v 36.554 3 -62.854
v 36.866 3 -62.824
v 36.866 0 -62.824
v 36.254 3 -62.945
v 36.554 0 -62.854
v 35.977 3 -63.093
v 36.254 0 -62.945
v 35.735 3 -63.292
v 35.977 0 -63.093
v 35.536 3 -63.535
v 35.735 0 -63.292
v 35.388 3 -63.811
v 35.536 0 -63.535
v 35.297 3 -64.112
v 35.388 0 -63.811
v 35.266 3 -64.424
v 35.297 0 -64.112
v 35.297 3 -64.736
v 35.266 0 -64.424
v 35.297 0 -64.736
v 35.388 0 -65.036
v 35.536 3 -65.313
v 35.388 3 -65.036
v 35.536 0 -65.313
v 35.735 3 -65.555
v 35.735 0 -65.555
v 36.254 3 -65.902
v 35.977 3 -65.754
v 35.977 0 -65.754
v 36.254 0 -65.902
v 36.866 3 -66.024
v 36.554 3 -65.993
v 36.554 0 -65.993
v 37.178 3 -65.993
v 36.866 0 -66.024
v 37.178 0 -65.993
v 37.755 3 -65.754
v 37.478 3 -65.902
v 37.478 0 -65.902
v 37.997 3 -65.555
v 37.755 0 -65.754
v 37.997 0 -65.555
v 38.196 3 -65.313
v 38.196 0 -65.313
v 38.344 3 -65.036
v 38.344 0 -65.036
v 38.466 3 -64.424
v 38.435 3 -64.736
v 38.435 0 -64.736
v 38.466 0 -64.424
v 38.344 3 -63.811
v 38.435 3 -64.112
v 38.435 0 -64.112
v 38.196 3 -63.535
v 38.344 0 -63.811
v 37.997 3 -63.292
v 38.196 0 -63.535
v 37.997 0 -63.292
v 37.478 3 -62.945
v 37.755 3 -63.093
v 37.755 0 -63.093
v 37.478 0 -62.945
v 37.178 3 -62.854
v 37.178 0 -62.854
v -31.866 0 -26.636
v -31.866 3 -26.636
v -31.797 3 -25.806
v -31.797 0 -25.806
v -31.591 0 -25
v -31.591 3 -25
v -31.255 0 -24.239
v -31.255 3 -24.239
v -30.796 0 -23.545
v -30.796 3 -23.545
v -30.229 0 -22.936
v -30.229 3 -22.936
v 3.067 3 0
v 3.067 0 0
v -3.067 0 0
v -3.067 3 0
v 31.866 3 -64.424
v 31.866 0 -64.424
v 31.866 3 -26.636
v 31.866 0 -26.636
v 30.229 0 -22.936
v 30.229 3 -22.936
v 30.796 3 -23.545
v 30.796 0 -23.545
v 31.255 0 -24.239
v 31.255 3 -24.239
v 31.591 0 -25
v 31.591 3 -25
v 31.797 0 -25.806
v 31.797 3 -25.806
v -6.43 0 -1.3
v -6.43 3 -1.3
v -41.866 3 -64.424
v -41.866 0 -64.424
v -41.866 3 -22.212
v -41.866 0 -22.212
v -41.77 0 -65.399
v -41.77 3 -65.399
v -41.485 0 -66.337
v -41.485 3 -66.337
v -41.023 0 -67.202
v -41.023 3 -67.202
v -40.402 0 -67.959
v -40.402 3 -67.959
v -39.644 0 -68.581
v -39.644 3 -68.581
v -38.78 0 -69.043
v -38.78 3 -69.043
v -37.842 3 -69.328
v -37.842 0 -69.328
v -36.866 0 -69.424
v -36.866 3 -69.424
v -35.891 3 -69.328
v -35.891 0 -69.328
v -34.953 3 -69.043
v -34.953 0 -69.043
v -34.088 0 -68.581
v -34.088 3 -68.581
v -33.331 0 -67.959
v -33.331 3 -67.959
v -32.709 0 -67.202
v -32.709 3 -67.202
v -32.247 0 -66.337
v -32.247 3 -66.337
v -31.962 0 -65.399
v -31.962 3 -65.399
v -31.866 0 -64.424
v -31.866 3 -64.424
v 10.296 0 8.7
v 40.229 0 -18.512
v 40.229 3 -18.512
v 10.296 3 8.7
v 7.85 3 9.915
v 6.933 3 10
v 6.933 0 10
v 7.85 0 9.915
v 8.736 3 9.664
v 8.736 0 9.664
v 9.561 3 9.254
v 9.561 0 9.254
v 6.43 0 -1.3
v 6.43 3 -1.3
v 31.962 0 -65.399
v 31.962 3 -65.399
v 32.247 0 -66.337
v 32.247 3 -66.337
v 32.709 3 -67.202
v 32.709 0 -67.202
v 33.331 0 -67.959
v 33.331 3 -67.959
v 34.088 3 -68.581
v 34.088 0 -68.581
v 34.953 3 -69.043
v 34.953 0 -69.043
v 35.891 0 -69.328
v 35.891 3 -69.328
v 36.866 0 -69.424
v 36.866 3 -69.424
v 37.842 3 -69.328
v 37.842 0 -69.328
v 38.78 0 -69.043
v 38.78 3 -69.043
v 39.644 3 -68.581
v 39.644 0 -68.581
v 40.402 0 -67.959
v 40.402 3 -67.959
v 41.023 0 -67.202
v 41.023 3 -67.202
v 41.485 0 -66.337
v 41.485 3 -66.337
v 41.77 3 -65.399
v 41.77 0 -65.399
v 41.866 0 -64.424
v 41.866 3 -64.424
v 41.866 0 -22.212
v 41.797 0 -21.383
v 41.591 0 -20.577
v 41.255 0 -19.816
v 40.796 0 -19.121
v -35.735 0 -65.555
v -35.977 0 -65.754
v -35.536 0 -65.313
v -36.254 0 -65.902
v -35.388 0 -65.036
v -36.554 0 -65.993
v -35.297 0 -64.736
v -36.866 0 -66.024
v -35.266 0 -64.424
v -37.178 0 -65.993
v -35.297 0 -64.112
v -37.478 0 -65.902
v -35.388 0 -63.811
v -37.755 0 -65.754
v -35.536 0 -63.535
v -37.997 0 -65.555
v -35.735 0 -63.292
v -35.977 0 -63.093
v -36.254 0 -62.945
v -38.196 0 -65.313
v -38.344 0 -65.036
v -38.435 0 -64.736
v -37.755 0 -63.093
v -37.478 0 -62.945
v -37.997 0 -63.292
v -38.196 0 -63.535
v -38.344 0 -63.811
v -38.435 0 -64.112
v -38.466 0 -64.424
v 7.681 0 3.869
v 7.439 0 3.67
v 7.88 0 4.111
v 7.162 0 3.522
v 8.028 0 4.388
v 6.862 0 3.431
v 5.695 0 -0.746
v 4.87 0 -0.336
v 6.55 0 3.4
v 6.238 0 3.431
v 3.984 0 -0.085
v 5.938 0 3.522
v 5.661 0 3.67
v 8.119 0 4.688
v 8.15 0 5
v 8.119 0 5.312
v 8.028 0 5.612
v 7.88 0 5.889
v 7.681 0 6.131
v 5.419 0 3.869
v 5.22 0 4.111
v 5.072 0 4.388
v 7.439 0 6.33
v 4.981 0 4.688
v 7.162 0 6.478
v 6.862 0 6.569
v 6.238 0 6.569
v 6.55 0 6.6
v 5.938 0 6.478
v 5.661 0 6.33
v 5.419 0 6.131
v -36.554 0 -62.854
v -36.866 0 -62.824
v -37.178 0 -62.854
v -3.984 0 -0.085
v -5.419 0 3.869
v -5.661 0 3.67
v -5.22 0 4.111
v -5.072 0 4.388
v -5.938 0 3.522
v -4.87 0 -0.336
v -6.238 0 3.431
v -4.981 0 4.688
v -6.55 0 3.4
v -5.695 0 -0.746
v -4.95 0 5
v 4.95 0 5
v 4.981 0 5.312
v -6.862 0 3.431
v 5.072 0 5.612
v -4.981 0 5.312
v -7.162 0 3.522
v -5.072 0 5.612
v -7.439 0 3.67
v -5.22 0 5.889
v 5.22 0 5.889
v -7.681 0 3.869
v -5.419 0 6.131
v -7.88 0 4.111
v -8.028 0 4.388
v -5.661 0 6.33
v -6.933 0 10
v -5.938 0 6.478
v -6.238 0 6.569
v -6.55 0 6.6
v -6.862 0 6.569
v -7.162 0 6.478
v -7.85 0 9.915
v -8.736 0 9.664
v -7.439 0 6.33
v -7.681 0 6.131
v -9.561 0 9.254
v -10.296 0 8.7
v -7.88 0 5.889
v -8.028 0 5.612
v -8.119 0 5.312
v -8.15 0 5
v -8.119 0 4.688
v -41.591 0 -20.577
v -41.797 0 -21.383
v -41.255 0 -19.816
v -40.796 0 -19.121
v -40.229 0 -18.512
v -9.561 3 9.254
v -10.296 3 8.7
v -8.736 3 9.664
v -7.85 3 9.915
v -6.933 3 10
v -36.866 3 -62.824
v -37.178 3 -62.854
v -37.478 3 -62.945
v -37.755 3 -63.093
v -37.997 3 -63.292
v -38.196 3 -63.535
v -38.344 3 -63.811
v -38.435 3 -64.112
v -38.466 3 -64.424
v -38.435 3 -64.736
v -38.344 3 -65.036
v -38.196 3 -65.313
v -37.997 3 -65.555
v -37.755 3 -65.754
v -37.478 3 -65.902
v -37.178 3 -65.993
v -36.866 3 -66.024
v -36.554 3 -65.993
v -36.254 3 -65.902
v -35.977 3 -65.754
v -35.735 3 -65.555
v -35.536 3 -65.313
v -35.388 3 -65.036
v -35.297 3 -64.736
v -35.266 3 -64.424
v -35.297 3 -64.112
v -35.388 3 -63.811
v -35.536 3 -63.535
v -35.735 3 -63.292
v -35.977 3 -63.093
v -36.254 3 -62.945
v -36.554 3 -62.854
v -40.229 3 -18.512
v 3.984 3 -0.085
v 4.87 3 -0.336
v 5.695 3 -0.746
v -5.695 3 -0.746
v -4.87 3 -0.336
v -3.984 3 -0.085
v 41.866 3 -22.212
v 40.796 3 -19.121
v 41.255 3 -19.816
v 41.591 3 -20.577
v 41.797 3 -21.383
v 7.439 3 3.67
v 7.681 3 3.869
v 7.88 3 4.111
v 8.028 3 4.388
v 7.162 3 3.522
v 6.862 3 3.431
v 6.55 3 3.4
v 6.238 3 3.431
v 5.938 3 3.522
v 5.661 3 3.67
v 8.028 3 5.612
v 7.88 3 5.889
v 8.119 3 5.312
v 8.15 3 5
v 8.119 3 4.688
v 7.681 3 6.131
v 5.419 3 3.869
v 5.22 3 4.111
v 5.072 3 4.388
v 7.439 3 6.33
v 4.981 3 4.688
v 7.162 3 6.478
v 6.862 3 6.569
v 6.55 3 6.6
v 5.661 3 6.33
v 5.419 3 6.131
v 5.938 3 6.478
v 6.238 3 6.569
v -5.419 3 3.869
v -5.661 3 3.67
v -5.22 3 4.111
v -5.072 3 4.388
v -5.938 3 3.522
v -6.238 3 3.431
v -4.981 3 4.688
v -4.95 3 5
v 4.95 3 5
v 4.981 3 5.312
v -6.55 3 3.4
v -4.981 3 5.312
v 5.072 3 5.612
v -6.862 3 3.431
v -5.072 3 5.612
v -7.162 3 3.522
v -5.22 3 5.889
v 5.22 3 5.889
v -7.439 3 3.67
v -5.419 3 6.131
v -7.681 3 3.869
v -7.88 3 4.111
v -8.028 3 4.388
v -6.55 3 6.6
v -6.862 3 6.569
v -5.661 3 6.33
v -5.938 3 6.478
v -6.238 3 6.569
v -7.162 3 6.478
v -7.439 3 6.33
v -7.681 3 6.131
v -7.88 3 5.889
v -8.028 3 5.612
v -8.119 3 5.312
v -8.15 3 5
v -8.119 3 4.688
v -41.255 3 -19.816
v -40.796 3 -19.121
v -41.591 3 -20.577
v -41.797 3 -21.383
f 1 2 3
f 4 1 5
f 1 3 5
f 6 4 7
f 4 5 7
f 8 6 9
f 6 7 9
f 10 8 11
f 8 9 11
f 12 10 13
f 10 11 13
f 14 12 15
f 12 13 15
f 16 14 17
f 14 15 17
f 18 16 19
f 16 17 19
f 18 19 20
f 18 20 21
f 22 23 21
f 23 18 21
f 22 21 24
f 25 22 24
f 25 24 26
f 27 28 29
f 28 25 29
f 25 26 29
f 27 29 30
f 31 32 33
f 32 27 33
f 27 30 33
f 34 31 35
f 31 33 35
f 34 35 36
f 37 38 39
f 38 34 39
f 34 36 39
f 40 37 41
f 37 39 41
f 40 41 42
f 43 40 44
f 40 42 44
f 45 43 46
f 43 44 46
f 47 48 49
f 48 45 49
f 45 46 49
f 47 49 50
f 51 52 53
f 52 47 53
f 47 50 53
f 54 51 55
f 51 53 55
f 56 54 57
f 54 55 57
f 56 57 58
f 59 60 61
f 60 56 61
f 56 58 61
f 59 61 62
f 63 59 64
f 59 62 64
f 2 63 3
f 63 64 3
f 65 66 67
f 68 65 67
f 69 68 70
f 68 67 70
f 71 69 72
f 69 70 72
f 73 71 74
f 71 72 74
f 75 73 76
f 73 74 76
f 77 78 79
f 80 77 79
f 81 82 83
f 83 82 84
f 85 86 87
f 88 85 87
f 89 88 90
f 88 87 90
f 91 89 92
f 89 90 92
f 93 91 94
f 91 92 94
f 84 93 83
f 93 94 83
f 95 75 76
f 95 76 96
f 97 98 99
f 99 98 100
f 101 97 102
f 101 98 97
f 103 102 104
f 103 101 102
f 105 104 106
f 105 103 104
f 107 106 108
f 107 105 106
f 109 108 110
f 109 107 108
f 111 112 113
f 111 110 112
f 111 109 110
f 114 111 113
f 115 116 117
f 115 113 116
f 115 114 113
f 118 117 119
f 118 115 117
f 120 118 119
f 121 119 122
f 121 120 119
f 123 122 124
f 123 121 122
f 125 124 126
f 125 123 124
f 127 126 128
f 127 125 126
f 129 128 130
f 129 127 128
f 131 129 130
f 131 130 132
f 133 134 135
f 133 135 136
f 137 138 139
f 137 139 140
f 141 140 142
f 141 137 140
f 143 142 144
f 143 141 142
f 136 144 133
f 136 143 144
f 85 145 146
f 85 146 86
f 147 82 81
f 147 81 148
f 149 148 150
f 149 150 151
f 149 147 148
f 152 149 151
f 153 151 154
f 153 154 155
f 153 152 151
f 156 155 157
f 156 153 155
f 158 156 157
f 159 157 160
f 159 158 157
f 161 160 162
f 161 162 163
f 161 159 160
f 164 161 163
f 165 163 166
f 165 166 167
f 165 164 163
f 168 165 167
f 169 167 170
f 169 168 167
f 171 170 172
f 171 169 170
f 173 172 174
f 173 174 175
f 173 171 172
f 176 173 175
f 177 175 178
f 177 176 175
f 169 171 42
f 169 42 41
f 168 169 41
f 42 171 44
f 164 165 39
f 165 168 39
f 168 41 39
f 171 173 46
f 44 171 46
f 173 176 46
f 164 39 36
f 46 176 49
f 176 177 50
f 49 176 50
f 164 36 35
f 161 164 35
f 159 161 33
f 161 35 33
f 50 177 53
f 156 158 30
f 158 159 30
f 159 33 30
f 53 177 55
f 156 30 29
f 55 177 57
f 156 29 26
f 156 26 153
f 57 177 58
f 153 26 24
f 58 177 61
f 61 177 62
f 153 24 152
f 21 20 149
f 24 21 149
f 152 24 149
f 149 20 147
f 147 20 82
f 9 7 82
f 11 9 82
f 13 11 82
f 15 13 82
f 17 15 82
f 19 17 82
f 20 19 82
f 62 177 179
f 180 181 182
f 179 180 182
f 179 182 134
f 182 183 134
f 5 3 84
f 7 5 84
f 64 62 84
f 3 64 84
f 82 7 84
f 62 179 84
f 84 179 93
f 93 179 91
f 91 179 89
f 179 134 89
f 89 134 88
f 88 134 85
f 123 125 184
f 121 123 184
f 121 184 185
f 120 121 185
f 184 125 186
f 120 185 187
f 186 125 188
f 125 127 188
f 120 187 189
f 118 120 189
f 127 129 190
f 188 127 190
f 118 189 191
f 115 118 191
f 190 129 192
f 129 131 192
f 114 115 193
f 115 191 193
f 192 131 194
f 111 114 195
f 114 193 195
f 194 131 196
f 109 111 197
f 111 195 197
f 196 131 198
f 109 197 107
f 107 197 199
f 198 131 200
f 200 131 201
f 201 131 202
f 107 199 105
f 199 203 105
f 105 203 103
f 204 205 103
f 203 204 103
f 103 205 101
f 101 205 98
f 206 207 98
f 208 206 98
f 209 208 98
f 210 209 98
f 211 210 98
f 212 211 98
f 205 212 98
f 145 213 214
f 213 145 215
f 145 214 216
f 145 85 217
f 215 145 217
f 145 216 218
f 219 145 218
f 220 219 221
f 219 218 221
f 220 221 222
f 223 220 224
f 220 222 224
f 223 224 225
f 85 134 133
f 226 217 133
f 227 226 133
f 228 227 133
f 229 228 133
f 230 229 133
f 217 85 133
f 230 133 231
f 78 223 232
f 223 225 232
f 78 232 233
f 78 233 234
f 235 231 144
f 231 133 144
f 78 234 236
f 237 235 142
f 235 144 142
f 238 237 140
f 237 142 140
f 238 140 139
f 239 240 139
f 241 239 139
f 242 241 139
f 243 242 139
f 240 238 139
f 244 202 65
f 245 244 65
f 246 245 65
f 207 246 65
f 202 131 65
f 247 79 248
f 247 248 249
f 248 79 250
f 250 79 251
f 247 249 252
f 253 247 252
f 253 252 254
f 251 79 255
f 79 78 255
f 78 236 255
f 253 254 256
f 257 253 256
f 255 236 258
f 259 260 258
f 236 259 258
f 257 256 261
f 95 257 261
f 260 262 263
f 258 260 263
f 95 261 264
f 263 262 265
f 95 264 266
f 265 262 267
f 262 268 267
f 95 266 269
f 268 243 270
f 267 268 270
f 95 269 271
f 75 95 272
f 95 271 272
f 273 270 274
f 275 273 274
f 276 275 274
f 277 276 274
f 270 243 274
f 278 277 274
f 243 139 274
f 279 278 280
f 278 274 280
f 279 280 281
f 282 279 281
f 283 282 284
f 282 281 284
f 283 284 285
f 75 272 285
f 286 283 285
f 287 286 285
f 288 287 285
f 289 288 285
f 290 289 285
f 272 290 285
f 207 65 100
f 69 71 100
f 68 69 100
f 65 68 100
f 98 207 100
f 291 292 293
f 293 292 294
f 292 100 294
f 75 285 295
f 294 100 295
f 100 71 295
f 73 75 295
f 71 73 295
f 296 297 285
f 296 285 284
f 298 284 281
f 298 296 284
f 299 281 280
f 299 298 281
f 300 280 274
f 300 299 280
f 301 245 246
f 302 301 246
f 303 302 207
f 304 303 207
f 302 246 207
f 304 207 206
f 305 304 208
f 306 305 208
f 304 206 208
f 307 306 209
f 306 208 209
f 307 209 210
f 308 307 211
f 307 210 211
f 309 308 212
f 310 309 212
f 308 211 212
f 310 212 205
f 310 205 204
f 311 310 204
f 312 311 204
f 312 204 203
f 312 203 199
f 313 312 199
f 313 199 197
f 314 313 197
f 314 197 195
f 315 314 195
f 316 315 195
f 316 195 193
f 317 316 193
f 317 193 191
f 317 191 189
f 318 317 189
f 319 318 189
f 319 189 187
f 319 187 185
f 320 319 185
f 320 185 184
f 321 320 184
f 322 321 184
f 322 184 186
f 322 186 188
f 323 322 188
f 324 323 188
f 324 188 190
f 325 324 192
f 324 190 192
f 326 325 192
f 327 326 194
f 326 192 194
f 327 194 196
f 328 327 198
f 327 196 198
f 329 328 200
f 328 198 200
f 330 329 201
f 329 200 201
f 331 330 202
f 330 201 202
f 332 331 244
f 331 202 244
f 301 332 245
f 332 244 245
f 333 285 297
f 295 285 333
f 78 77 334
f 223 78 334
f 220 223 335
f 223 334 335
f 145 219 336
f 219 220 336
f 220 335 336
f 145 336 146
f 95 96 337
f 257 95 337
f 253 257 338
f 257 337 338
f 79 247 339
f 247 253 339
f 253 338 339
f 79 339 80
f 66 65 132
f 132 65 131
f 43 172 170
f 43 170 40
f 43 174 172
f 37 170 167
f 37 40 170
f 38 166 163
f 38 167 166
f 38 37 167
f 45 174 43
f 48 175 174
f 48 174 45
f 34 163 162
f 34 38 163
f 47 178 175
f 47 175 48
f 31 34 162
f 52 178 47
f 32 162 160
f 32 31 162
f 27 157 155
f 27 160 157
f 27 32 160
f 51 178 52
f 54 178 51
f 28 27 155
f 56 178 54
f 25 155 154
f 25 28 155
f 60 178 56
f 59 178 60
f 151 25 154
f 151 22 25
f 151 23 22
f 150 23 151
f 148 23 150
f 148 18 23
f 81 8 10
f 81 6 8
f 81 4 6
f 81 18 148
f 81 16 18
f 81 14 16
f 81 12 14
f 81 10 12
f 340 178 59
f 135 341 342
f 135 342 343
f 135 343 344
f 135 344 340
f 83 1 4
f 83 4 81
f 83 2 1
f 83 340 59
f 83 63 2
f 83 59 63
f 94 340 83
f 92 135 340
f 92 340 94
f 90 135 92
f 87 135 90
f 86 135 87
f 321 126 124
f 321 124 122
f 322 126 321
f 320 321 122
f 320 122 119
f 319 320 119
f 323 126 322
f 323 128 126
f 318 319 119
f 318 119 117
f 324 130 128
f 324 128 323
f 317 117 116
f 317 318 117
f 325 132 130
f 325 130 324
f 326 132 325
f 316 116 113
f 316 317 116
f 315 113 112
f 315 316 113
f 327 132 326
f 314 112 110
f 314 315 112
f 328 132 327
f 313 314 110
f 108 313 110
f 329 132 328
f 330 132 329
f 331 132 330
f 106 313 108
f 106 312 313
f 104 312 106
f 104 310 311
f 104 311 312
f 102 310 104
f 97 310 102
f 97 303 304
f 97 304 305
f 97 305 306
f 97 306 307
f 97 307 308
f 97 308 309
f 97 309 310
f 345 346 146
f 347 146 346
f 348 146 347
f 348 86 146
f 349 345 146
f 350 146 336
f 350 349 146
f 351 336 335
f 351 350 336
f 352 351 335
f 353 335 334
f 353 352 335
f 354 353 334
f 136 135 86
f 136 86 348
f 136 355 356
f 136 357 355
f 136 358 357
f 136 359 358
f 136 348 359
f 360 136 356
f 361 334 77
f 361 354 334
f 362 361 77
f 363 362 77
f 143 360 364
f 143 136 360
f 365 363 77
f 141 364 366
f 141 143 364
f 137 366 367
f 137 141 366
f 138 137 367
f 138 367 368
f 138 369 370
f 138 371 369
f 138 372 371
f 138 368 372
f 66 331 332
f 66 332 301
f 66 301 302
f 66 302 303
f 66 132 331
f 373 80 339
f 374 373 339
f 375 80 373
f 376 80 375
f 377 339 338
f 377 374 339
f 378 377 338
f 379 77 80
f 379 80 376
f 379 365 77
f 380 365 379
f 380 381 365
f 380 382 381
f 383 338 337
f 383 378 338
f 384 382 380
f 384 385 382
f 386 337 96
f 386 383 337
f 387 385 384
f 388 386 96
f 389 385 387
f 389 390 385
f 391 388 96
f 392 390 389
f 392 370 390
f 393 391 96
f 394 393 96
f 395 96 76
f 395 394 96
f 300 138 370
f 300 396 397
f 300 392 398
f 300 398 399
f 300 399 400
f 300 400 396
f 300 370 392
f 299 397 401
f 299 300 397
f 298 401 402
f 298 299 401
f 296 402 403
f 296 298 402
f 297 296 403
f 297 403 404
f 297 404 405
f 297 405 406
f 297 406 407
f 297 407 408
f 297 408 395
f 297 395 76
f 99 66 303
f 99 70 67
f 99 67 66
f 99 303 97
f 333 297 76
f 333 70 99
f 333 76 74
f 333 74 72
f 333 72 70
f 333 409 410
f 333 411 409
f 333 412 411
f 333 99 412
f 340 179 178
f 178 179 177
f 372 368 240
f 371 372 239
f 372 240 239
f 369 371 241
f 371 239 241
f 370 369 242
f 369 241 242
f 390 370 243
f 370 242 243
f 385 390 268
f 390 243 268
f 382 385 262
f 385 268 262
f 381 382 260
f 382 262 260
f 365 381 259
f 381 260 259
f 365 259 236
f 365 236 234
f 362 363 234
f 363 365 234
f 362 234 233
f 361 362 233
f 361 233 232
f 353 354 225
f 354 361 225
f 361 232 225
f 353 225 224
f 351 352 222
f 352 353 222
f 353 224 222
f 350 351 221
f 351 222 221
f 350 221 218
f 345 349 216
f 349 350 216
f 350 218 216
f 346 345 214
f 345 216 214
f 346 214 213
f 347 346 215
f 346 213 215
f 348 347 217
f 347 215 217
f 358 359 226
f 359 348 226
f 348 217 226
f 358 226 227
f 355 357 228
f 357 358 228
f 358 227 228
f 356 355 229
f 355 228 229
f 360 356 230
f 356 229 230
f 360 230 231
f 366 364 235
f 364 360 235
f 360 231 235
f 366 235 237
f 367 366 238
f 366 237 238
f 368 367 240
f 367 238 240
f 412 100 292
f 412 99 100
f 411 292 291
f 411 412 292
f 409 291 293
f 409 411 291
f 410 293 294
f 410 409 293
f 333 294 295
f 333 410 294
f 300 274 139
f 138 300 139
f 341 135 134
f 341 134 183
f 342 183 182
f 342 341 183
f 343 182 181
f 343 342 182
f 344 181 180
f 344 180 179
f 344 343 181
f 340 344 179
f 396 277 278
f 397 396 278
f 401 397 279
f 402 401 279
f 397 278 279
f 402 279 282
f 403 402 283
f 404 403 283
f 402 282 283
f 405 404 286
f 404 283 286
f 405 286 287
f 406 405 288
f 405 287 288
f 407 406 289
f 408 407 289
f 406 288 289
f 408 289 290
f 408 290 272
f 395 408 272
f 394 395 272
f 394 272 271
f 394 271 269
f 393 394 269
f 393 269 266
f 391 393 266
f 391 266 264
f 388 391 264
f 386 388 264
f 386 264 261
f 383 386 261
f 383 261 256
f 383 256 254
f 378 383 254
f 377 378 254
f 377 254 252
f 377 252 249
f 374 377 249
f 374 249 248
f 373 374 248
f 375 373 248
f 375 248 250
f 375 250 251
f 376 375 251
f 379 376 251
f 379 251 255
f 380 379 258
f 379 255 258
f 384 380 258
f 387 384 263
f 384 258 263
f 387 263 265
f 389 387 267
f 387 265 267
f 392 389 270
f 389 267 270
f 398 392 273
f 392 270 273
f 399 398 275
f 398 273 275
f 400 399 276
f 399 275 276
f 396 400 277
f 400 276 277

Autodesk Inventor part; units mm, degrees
ref_plane "YZ Plane" through (0, 0, 0) normal (1, 0, 0) x (0, 1, 0)
ref_plane "XZ Plane" through (0, 0, 0) normal (0, 1, 0) x (-1, 0, 0)
ref_plane "XY Plane" through (0, 0, 0) normal (0, 0, 1) x (1, 0, 0)
sketch "Sketch3" plane through (0, 0, 0) normal (0, 1, 0) x (-1, 0, 0)
  line L0 (0, 0) -> (5, 0)
  line L1 (31.8661, -24.4237) -> (31.8661, -64.4237)
  line L2 (41.8661, -64.4237) -> (41.8661, -20)
  line L3 (0, 10) -> (0, 0)
  line L4 (8.8661, 10) -> (41.8661, -20)
  line L5 (31.8661, -24.4237) -> (5, 0)
  line L6 (8.8661, 10) -> (0, 10)
  line L7 (5, 0) -> (0, 0)
  line L8 (31.8661, -24.4237) -> (31.8661, -64.4237)
  line L9 (41.8661, -64.4237) -> (41.8661, -20)
  line L10 (5, 0) -> (0, 0)
  arc A0 (31.8661, -64.4237) -> (41.8661, -64.4237) centre (36.8661, -64.4237) ccw
  circle A1 centre (0, -35.9984) radius 30
  point P0 (31.8661, -44.4237)
  point P1 (0, 5)
  dimension "d51" = 10
  dimension "d56" = 10
  dimension "d57" = 30
  dimension "d58" = 33
  dimension "d59" = 5
  dimension "d60" = 5
  dimension "d61" = 40
  dimension "d64" = 10
  dimension "d65" = 10
  dimension "d66" = 60
extrude "Extrusion2" add sketch "Sketch3" along normal blind 3 contours L3 L6 L4 L2 A0 L1 L5 L0
sketch "Sketch4" plane through (0, 3, 0) normal (0, 1, 0) x (1, 0, 0)
  line L0 (0, -10) -> (0, 0) projected
  arc A0 (-31.8661, 64.4237) -> (-41.8661, 64.4237) centre (-36.8661, 64.4237) ccw projected
  point P0 (-6.55, -5)
  point P1 (0, -5)
  point P2 (-36.8661, 69.4237)
  dimension "d77" = 6.55
hole "Hole2" at (-6.55, 3, 5) at (-36.8661, 3, -64.4237) direction (0, -1, 0) diameter 3.2 end through all clearance for "Countersunk Flat Head Screw DIN EN ISO 2009" size "M3" standard "DIN"
fillet "Fillet1" radius 5 4 edges at (-8.8661, 1.5, 10) (-41.8661, 1.5, -20) (-31.8661, 1.5, -24.4237) (-5, 1.5, 0)
mirror "Mirror3" about plane through (0, 0, 10) normal (1, 0, 0) of "Extrusion2", "Hole2", "Fillet1"
properties part number "Claw4" material "Copper, Cast"
